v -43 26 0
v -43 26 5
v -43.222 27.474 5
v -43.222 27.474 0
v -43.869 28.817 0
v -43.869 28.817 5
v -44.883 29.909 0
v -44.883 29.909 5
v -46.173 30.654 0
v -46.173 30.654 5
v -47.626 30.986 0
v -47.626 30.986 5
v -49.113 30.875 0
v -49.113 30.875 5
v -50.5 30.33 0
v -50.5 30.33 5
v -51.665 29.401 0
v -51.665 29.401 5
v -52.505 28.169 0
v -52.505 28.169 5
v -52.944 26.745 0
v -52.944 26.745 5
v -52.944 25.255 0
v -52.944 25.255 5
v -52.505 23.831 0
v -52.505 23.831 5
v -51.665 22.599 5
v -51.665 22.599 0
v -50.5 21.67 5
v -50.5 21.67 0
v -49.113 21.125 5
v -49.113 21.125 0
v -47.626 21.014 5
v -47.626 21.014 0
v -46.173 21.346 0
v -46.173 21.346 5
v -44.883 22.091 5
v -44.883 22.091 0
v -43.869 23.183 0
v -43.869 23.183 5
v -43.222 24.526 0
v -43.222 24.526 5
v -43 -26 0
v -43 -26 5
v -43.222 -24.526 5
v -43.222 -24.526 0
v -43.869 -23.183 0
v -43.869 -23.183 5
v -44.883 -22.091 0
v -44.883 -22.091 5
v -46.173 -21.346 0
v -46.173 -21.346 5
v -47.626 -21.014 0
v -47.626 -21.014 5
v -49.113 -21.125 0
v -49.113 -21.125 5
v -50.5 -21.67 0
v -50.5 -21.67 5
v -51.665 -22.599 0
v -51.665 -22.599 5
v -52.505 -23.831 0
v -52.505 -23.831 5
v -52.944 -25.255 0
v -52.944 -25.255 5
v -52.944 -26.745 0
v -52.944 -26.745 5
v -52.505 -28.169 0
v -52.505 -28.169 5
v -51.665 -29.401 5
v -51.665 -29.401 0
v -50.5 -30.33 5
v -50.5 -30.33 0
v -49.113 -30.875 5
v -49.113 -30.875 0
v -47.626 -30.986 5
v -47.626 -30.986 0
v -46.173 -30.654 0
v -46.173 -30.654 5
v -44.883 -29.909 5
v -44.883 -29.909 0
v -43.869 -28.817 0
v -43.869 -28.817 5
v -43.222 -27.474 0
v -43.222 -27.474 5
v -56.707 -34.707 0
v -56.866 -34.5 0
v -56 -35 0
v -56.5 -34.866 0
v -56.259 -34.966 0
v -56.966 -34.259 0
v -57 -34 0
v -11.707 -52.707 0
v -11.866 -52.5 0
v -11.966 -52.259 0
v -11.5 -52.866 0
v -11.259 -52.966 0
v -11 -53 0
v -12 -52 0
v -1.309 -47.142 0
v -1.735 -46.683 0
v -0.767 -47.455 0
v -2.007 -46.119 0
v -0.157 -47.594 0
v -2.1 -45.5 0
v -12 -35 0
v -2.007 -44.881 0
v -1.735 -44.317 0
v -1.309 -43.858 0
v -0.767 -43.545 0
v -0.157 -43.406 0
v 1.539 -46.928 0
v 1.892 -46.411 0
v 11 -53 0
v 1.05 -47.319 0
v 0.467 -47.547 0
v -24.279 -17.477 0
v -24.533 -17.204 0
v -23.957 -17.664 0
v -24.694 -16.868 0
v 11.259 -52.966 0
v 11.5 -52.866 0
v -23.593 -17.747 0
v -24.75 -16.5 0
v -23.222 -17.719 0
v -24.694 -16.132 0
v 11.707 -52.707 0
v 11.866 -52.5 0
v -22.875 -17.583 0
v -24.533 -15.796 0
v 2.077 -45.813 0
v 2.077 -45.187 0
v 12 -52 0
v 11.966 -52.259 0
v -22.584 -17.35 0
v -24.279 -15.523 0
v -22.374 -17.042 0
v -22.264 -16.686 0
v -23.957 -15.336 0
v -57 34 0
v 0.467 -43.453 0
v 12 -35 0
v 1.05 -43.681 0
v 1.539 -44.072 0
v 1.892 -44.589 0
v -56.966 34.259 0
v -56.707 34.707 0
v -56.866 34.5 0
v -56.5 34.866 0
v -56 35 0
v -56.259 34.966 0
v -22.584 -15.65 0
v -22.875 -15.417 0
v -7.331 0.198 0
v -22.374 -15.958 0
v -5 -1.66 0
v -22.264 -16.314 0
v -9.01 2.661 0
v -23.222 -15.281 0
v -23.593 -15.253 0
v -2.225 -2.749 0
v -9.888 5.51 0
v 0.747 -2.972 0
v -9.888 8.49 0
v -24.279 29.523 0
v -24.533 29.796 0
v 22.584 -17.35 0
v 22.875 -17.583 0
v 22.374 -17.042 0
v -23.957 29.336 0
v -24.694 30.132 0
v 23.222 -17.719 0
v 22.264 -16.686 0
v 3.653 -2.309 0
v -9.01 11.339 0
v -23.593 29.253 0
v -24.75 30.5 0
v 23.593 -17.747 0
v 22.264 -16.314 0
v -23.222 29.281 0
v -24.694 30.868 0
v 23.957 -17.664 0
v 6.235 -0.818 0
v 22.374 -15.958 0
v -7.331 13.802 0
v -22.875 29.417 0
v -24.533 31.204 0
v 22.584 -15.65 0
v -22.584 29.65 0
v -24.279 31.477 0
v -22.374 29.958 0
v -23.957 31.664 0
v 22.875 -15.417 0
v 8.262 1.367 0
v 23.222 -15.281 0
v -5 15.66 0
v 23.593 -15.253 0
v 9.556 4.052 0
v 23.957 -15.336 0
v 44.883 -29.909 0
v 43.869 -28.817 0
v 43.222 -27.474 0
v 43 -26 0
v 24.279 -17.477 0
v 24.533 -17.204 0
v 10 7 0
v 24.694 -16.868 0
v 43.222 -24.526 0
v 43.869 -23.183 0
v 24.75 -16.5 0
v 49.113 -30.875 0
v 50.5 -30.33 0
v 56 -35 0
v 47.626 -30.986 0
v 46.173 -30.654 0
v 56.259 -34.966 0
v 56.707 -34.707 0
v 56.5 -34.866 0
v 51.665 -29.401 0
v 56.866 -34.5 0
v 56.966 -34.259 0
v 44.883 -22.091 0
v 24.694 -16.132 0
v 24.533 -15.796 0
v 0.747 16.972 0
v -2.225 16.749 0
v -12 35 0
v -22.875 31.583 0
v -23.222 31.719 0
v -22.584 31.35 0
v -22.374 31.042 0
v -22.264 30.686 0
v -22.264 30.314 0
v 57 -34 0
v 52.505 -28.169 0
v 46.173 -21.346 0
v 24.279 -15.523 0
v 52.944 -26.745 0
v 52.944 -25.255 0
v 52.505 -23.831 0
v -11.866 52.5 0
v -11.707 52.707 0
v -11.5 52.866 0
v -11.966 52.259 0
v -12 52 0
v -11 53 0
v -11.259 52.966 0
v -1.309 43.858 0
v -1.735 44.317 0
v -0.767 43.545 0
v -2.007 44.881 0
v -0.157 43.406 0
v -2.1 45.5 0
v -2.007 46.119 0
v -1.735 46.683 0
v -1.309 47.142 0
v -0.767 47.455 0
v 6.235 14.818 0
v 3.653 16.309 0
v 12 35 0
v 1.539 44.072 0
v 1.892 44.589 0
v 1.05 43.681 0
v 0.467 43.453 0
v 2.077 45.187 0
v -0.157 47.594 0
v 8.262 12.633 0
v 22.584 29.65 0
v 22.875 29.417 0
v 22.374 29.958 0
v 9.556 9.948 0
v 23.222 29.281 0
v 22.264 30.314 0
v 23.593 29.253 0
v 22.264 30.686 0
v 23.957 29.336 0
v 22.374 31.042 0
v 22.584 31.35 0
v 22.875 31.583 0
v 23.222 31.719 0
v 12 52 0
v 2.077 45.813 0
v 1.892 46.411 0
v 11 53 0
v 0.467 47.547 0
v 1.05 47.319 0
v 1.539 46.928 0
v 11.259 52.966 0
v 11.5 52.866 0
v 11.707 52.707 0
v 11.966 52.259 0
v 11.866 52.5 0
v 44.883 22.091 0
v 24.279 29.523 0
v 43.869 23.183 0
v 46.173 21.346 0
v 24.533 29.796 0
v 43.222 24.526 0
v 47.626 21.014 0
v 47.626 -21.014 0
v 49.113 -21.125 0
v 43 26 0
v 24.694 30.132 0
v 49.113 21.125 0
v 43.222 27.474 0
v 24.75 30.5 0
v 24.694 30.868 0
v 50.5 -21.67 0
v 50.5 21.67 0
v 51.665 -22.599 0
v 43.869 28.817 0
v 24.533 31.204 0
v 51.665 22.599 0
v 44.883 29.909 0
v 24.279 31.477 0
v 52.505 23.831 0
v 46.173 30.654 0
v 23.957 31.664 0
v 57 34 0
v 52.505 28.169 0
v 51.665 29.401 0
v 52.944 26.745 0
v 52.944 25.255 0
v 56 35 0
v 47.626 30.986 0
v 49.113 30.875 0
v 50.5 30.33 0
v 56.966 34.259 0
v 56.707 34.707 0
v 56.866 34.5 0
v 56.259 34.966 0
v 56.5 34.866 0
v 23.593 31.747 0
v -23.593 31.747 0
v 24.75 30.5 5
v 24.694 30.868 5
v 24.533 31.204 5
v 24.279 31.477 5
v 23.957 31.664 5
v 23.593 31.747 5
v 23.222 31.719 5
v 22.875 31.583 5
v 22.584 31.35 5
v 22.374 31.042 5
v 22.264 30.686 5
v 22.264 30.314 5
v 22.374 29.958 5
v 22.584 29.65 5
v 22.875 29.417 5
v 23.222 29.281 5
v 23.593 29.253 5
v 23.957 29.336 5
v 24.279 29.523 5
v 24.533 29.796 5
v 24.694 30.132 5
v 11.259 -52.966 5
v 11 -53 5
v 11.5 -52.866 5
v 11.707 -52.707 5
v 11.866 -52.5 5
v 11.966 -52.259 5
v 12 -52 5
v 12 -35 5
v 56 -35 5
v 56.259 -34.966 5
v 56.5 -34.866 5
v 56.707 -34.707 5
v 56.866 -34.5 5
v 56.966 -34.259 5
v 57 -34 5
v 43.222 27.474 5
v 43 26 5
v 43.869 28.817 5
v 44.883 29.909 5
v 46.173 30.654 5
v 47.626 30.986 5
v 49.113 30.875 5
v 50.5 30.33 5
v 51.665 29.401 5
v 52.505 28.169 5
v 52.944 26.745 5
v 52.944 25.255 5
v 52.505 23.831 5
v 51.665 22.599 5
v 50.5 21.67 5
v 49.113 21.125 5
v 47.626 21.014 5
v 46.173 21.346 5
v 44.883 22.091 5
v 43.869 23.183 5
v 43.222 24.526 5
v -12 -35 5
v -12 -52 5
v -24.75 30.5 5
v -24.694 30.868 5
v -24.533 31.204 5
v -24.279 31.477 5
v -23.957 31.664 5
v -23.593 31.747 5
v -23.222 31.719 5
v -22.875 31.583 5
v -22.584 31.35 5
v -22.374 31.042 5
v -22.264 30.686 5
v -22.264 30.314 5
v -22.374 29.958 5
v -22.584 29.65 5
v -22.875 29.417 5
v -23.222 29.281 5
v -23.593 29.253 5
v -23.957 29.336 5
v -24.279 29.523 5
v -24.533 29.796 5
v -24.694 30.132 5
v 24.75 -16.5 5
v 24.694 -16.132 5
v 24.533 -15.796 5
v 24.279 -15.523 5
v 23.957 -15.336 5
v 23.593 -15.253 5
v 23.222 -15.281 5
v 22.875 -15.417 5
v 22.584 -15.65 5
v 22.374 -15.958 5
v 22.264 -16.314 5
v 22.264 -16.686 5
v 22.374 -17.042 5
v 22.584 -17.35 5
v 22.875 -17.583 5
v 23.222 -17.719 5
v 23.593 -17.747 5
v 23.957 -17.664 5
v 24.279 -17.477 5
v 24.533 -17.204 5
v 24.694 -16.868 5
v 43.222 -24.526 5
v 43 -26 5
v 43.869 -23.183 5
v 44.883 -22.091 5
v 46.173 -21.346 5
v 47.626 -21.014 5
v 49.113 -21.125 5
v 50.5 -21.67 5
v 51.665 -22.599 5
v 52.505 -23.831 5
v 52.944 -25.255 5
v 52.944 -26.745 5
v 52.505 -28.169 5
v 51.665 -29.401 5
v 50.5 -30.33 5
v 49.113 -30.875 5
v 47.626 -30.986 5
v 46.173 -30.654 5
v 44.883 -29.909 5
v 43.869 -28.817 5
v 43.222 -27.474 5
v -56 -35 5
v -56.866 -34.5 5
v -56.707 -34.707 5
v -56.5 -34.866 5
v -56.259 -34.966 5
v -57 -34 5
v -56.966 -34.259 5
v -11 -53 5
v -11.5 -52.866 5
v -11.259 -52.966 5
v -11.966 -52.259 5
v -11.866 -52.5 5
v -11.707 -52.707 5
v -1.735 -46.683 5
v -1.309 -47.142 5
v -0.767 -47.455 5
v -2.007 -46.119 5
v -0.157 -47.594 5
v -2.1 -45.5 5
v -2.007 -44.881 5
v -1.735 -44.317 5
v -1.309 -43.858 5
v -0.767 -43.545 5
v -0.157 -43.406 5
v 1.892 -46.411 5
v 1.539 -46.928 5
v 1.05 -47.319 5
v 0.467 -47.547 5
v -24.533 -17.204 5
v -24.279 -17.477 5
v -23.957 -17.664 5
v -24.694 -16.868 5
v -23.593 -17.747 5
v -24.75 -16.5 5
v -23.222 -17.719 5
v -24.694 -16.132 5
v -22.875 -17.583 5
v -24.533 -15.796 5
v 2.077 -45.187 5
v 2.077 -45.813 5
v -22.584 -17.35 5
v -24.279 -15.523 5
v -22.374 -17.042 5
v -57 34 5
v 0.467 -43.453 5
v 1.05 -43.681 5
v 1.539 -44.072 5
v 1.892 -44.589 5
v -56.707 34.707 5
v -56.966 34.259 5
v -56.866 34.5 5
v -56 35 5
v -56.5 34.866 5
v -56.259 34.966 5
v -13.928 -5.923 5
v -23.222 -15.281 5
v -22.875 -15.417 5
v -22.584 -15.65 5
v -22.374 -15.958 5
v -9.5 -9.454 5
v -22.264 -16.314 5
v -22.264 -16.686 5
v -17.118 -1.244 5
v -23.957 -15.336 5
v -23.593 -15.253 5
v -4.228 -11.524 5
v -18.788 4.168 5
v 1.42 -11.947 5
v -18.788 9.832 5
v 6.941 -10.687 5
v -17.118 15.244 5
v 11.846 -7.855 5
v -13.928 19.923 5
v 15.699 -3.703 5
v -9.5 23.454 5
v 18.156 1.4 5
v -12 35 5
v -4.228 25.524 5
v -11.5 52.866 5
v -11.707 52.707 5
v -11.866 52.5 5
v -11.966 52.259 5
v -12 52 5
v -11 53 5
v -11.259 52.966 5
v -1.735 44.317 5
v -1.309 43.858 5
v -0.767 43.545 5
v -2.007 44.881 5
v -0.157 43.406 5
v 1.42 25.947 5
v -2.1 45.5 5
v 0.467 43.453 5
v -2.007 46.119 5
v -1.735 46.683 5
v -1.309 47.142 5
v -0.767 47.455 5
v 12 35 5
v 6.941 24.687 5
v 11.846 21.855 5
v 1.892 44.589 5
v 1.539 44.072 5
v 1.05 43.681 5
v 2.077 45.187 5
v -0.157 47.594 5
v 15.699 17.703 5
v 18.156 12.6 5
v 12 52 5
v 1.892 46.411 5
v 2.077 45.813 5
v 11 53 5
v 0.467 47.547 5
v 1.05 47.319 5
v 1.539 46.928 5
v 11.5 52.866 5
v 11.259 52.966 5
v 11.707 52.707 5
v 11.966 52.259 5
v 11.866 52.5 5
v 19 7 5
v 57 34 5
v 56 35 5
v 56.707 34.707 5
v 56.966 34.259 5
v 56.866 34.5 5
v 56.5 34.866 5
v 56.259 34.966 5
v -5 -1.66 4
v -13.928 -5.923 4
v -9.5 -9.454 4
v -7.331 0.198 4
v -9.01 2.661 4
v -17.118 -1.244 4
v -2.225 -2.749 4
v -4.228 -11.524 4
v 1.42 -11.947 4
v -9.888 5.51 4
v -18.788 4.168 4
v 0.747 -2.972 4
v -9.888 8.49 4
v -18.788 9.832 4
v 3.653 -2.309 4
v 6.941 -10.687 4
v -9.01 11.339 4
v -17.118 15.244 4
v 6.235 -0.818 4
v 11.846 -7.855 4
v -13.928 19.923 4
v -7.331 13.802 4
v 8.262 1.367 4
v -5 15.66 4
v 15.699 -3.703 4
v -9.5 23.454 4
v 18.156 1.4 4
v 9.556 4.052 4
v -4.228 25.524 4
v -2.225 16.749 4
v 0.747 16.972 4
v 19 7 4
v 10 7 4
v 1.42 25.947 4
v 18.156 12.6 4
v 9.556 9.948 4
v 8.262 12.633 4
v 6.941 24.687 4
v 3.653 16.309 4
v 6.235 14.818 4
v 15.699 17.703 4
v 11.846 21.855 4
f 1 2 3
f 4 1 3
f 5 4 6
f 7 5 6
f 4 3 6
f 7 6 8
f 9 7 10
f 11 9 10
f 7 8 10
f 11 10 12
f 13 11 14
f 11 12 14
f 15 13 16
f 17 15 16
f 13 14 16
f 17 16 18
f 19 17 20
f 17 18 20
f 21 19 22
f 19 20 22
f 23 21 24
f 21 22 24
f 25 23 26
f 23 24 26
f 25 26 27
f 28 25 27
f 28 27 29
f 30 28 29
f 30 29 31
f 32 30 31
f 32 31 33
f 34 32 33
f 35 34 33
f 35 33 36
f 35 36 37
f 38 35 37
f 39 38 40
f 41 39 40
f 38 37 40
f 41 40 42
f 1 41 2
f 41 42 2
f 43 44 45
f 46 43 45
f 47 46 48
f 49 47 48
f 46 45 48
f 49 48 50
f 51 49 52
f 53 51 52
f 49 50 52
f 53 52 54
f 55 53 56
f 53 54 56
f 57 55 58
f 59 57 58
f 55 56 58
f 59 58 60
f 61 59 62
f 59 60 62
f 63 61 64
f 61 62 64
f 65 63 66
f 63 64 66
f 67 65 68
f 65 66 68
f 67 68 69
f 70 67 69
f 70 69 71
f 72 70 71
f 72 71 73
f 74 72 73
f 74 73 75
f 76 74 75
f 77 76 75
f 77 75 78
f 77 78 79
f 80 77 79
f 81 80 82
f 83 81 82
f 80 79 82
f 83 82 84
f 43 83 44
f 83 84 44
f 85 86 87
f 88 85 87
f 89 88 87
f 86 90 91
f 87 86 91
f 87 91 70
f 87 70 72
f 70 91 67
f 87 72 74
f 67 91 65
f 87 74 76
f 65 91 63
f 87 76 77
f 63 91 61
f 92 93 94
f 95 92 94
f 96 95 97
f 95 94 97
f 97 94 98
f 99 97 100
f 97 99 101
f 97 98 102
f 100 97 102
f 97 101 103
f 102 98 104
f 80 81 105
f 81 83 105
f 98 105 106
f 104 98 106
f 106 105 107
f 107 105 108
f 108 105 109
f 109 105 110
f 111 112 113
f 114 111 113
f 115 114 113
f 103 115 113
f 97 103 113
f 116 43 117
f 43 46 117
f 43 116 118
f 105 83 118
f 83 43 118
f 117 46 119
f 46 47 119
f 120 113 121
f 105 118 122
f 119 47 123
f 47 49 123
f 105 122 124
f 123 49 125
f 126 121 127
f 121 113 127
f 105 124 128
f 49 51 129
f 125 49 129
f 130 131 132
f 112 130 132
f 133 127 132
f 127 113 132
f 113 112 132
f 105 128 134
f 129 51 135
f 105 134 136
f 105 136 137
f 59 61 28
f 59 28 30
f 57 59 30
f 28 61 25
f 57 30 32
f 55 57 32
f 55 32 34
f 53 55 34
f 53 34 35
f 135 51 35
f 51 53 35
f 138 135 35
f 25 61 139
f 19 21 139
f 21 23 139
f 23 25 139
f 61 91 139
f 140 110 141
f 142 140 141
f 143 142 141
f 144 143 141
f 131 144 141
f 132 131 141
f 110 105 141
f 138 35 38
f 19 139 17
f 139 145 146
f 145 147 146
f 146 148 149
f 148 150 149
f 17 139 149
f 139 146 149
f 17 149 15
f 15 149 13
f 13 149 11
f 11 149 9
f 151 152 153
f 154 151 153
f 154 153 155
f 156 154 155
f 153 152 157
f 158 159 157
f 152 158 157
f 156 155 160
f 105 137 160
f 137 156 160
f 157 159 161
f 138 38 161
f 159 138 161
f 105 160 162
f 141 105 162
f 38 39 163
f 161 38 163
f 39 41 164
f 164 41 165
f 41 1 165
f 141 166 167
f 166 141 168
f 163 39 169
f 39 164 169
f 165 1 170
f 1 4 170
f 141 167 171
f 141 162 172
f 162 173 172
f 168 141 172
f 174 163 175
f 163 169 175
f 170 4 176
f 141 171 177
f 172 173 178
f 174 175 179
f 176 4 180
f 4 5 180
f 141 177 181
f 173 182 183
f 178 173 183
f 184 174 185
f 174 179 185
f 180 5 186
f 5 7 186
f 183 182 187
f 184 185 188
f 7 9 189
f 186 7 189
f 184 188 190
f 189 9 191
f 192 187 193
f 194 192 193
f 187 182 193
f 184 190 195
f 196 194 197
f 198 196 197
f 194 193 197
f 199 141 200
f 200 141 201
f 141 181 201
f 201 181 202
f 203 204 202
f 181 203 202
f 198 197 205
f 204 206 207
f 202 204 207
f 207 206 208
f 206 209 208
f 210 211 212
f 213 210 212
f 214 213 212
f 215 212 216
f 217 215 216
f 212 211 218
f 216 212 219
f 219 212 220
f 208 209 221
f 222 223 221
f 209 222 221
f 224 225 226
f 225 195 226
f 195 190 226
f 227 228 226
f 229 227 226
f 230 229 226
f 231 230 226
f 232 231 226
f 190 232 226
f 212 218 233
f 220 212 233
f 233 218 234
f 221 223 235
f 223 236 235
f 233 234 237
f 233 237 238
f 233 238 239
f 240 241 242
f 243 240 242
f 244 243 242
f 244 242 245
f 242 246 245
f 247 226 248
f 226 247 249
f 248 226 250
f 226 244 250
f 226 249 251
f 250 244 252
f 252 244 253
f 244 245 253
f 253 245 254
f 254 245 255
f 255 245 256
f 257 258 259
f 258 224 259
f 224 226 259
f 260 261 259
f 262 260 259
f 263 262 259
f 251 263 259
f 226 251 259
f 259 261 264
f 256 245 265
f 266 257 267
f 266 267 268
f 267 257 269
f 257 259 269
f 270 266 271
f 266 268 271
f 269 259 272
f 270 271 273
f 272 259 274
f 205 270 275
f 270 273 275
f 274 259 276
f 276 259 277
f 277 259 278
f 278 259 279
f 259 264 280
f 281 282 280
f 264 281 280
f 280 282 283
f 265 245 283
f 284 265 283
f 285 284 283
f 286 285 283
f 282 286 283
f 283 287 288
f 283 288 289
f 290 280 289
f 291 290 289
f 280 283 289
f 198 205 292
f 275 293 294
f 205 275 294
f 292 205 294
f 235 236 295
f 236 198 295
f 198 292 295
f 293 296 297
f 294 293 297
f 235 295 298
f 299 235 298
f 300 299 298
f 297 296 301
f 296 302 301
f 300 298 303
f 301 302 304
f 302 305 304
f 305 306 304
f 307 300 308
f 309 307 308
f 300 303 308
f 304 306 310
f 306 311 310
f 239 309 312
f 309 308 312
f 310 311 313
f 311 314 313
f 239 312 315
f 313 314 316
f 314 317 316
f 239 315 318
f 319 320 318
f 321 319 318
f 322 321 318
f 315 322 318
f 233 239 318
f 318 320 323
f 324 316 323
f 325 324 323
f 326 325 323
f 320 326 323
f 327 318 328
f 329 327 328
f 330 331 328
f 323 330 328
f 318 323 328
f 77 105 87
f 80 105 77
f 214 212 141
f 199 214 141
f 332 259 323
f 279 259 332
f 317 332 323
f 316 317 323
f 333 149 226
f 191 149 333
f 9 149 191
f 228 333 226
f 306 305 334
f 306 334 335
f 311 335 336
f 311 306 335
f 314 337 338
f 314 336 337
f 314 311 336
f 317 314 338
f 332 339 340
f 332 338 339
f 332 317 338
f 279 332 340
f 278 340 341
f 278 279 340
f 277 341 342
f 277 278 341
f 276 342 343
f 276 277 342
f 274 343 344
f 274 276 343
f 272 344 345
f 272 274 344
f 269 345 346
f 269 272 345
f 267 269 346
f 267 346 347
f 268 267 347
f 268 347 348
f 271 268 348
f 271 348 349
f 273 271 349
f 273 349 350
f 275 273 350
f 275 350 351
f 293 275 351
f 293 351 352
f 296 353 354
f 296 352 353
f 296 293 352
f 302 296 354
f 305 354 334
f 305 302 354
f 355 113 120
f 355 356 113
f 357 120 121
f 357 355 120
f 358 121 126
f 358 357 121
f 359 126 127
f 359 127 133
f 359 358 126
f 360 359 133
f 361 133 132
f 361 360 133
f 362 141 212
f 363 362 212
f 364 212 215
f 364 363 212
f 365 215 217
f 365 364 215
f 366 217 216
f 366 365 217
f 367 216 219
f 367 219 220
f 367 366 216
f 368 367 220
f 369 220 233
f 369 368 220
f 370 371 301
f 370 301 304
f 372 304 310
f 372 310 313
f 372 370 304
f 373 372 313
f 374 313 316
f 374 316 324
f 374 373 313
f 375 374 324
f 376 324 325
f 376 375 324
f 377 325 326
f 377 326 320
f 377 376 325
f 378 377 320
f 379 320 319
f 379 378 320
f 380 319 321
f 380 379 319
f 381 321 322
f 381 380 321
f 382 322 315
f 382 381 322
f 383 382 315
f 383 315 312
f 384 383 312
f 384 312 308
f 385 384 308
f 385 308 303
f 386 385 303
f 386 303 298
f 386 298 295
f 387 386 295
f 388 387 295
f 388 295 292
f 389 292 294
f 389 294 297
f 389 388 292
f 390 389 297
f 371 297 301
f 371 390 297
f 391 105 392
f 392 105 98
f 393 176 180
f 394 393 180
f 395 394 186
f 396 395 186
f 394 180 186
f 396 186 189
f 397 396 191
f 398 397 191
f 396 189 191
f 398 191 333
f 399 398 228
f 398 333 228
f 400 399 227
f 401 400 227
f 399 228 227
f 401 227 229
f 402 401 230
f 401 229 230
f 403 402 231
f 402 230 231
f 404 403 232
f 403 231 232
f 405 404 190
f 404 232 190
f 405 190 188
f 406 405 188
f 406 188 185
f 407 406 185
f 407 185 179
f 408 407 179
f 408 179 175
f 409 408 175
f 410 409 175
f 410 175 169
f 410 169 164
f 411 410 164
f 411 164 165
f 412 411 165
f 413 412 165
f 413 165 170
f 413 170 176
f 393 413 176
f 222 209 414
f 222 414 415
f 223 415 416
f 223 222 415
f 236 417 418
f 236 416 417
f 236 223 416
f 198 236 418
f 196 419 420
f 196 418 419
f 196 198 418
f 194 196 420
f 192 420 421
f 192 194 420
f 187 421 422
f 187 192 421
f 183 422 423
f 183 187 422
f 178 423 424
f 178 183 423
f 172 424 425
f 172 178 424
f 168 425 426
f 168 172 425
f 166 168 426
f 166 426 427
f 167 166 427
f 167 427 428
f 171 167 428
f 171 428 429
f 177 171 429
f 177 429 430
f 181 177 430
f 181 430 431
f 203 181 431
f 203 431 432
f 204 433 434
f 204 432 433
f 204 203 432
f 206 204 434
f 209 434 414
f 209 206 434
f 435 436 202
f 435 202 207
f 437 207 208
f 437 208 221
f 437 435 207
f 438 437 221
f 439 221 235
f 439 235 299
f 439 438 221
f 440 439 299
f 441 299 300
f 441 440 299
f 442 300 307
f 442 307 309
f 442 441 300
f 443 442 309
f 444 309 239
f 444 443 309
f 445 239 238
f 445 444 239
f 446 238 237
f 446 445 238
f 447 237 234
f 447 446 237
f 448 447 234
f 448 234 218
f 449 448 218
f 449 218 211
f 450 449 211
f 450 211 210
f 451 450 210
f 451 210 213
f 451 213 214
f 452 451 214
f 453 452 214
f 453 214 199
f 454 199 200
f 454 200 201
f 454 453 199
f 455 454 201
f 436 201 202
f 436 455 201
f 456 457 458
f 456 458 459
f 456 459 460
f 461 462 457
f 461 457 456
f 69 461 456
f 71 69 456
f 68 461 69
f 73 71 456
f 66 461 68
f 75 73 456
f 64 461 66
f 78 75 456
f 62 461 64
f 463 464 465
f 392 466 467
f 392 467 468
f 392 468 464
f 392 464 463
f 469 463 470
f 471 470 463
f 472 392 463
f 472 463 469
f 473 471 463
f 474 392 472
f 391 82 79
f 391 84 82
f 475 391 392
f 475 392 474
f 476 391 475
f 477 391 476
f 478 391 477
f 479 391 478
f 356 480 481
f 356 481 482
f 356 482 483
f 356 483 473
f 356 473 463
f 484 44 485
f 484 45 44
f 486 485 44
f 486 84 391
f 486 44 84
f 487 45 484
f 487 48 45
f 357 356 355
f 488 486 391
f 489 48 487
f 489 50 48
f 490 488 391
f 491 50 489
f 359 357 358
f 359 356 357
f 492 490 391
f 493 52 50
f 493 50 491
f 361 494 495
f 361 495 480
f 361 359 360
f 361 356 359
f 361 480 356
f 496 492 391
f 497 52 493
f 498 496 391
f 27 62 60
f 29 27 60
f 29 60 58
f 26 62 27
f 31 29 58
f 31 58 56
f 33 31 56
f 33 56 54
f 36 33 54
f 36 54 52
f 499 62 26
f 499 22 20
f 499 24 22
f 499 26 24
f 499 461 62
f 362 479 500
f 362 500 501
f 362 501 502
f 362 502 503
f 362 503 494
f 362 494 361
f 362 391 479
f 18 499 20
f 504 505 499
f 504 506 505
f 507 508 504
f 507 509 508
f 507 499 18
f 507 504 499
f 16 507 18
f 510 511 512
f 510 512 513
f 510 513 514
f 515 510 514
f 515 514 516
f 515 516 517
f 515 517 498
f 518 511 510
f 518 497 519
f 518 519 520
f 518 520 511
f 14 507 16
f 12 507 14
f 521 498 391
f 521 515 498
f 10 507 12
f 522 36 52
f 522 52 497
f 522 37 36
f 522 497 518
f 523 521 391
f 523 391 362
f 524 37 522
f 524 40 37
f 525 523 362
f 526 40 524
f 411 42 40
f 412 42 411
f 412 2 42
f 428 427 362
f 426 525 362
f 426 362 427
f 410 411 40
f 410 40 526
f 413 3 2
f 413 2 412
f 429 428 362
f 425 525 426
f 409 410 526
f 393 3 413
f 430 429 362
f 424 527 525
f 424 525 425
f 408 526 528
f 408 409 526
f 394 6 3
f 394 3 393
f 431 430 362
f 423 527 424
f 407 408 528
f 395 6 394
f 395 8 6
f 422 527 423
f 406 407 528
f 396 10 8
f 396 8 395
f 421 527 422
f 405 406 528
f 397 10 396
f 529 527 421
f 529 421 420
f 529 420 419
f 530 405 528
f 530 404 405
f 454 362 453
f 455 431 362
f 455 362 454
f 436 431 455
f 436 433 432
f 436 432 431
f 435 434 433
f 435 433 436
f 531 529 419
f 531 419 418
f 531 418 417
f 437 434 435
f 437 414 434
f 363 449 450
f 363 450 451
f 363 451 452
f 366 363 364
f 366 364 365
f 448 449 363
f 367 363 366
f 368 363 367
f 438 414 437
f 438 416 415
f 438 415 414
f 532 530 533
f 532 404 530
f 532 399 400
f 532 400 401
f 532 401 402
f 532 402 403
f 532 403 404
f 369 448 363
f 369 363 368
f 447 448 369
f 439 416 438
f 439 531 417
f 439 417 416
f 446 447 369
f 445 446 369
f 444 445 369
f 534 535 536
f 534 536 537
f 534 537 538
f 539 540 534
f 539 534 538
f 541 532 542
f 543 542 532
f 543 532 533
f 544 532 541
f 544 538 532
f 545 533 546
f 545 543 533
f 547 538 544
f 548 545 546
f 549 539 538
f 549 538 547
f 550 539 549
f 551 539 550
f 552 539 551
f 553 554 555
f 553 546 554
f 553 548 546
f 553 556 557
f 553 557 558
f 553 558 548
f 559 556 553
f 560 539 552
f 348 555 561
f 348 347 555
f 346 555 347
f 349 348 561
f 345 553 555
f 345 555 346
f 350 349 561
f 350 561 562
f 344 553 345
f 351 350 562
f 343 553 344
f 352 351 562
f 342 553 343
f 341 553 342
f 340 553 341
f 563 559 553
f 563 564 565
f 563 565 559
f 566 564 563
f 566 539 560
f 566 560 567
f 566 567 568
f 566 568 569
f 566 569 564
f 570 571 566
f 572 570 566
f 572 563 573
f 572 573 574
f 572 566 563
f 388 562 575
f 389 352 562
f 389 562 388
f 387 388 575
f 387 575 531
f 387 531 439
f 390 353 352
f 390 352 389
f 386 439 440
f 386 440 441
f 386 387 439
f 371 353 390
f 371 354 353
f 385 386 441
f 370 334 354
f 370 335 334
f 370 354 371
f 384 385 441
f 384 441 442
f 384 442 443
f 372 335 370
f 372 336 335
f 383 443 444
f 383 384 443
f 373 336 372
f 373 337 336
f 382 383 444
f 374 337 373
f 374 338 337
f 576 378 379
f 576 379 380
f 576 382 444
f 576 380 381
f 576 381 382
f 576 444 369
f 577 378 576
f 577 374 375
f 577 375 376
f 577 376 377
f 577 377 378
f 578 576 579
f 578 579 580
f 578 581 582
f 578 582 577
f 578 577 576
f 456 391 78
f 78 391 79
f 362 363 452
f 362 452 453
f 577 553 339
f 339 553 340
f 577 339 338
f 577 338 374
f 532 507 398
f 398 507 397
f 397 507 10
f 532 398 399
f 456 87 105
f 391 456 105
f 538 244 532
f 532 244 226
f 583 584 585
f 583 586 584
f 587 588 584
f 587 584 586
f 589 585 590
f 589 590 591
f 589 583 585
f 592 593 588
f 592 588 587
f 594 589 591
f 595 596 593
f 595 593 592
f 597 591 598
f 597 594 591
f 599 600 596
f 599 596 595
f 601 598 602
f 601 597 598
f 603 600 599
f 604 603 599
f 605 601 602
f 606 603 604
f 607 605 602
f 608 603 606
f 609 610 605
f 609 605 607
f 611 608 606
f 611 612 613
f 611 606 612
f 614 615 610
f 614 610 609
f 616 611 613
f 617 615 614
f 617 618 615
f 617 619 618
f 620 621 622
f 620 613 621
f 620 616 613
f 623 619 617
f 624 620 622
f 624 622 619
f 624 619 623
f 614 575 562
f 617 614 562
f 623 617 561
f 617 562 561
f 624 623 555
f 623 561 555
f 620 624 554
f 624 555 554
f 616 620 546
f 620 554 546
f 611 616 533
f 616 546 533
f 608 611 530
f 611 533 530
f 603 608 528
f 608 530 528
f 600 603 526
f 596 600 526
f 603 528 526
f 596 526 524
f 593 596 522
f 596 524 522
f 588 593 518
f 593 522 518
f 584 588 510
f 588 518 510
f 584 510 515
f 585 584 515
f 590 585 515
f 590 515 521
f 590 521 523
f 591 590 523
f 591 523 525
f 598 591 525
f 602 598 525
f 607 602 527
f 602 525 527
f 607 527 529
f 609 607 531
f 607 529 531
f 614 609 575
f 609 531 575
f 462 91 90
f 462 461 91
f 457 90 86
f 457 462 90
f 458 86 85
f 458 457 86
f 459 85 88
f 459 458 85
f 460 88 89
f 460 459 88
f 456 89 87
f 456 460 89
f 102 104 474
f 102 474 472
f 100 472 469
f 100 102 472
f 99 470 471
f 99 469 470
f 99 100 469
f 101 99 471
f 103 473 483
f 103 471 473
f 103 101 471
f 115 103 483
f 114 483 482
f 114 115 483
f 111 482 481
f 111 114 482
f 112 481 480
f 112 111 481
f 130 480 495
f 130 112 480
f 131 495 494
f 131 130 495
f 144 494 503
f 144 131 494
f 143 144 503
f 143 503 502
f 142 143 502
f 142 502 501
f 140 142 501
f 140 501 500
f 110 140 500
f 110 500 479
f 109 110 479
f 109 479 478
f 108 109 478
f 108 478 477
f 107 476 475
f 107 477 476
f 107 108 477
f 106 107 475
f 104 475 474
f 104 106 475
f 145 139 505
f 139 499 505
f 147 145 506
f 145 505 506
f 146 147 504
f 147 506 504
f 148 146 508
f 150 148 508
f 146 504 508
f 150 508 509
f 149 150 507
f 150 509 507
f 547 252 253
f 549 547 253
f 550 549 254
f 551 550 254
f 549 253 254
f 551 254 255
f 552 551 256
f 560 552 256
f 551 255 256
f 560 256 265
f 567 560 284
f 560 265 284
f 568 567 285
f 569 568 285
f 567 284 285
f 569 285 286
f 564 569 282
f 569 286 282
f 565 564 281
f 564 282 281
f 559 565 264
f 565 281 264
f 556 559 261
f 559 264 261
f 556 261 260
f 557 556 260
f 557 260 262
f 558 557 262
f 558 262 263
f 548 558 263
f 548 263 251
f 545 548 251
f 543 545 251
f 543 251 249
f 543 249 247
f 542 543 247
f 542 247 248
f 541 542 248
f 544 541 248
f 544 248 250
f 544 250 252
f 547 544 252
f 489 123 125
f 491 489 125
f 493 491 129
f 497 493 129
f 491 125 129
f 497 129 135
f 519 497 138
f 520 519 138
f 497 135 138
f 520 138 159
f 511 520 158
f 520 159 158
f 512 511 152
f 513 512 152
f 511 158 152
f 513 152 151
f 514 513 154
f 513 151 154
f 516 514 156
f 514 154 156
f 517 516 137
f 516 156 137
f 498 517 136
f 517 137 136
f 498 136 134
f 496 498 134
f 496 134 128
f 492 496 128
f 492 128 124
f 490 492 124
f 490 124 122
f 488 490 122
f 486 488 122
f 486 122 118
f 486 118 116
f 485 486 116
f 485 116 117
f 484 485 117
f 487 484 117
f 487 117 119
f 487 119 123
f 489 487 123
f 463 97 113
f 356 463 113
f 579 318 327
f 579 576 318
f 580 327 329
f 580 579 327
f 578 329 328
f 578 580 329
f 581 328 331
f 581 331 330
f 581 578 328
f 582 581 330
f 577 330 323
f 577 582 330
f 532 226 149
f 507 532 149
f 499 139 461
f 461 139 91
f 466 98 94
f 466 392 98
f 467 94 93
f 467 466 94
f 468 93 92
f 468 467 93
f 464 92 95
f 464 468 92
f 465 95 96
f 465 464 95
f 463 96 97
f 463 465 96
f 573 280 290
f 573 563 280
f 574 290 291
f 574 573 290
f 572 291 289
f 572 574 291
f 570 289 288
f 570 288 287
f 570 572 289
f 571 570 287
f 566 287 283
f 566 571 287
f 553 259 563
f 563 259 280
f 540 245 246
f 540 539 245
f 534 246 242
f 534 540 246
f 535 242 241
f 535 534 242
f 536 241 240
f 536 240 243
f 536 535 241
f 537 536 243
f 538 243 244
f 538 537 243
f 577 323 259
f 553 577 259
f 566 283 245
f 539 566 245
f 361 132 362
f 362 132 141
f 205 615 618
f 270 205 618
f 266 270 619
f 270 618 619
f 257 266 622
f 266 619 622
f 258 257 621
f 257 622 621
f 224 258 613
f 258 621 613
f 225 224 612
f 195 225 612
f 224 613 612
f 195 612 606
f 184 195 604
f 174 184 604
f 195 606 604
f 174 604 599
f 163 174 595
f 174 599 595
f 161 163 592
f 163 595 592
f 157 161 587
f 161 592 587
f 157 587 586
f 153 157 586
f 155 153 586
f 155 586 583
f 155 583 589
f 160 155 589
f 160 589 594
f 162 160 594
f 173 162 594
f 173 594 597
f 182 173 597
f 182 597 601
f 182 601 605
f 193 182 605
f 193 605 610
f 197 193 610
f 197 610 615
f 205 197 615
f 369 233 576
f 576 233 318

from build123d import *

# Parameters (mm, degrees)
EXTRUDE_1_DEPTH     = 5
FILLET_2_R          = 1
HOLE_WIZARD_M3_1_D  = 2.5
SKETCH_5_R          = 5
CUT_EXTRUDE_1_DEPTH = 5
HOLE_WIZARD_M5_1_D  = 4.2
SKETCH_7_R          = 10
CUT_EXTRUDE_2_DEPTH = 78.99358948
SKETCH_8_R          = 19
CUT_EXTRUDE_3_DEPTH = 1


with BuildPart() as part:
    # 草图1 → 凸台-拉伸1 (new body)
    with BuildSketch(Plane.XY):
        Polygon((-57, 35), (-57, -35), (-12, -35), (-12, -53), (12, -53), (12, -35), (57, -35), (57, 35), (12, 35), (12, 53), (-12, 53), (-12, 35), align=None)
    extrude(amount=EXTRUDE_1_DEPTH)

    # 圆角2
    fillet_2_edges = [part.edges().sort_by_distance(p)[0] for p in [
        (-12, 53, 2.5),
        (12, 53, 2.5),
        (57, 35, 2.5),
        (57, -35, 2.5),
        (12, -53, 2.5),
        (-12, -53, 2.5),
        (-57, -35, 2.5),
        (-57, 35, 2.5),
    ]]
    fillet(fillet_2_edges, radius=FILLET_2_R)

    # M3 螺纹孔的螺纹孔钻头1 (through all)
    with Locations(Plane(origin=(-23.5, 30.5, 5), x_dir=(1, 0, 0), z_dir=(0, 0, 1))):
        with Locations((0, 0), (0, -47)):
            hole_wizard_m3_1 = Hole(HOLE_WIZARD_M3_1_D / 2)

    # 镜向1: M3 螺纹孔的螺纹孔钻头1 across plane
    add(hole_wizard_m3_1.mirror(Plane(origin=(0, 0, 0), x_dir=(0, 0, 1), z_dir=(1, 0, 0))), mode=Mode.SUBTRACT)

    # 草图5 → 切除-拉伸1 (cut)
    with BuildSketch(Plane.XY.offset(5)):
        with Locations((-48, 26)):
            Circle(SKETCH_5_R)
        with Locations((-48, -26)):
            Circle(SKETCH_5_R)
    cut_extrude_1 = extrude(amount=-CUT_EXTRUDE_1_DEPTH, mode=Mode.SUBTRACT)

    # 镜向2: 切除-拉伸1 across plane
    add(cut_extrude_1.mirror(Plane(origin=(0, 0, 0), x_dir=(0, 0, 1), z_dir=(1, 0, 0))), mode=Mode.SUBTRACT)

    # M5 螺纹孔的螺纹孔钻头1 (through all)
    with Locations(Plane(origin=(0, 45.5, 5), x_dir=(1, 0, 0), z_dir=(0, 0, 1))):
        with Locations((0, 0)):
            hole_wizard_m5_1 = Hole(HOLE_WIZARD_M5_1_D / 2)

    # 镜向3: M5 螺纹孔的螺纹孔钻头1 across plane
    add(hole_wizard_m5_1.mirror(Plane.ZX), mode=Mode.SUBTRACT)

    # 草图7 → 切除-拉伸2 (cut, through all)
    with BuildSketch(Plane.XY.offset(5)):
        with Locations((0, 7)):
            Circle(SKETCH_7_R)
    extrude(amount=-CUT_EXTRUDE_2_DEPTH, mode=Mode.SUBTRACT)

    # 草图8 → 切除-拉伸3 (cut)
    with BuildSketch(Plane.XY.offset(5)):
        with Locations((0, 7)):
            Circle(SKETCH_8_R)
    extrude(amount=-CUT_EXTRUDE_3_DEPTH, mode=Mode.SUBTRACT)


solid = part.part
